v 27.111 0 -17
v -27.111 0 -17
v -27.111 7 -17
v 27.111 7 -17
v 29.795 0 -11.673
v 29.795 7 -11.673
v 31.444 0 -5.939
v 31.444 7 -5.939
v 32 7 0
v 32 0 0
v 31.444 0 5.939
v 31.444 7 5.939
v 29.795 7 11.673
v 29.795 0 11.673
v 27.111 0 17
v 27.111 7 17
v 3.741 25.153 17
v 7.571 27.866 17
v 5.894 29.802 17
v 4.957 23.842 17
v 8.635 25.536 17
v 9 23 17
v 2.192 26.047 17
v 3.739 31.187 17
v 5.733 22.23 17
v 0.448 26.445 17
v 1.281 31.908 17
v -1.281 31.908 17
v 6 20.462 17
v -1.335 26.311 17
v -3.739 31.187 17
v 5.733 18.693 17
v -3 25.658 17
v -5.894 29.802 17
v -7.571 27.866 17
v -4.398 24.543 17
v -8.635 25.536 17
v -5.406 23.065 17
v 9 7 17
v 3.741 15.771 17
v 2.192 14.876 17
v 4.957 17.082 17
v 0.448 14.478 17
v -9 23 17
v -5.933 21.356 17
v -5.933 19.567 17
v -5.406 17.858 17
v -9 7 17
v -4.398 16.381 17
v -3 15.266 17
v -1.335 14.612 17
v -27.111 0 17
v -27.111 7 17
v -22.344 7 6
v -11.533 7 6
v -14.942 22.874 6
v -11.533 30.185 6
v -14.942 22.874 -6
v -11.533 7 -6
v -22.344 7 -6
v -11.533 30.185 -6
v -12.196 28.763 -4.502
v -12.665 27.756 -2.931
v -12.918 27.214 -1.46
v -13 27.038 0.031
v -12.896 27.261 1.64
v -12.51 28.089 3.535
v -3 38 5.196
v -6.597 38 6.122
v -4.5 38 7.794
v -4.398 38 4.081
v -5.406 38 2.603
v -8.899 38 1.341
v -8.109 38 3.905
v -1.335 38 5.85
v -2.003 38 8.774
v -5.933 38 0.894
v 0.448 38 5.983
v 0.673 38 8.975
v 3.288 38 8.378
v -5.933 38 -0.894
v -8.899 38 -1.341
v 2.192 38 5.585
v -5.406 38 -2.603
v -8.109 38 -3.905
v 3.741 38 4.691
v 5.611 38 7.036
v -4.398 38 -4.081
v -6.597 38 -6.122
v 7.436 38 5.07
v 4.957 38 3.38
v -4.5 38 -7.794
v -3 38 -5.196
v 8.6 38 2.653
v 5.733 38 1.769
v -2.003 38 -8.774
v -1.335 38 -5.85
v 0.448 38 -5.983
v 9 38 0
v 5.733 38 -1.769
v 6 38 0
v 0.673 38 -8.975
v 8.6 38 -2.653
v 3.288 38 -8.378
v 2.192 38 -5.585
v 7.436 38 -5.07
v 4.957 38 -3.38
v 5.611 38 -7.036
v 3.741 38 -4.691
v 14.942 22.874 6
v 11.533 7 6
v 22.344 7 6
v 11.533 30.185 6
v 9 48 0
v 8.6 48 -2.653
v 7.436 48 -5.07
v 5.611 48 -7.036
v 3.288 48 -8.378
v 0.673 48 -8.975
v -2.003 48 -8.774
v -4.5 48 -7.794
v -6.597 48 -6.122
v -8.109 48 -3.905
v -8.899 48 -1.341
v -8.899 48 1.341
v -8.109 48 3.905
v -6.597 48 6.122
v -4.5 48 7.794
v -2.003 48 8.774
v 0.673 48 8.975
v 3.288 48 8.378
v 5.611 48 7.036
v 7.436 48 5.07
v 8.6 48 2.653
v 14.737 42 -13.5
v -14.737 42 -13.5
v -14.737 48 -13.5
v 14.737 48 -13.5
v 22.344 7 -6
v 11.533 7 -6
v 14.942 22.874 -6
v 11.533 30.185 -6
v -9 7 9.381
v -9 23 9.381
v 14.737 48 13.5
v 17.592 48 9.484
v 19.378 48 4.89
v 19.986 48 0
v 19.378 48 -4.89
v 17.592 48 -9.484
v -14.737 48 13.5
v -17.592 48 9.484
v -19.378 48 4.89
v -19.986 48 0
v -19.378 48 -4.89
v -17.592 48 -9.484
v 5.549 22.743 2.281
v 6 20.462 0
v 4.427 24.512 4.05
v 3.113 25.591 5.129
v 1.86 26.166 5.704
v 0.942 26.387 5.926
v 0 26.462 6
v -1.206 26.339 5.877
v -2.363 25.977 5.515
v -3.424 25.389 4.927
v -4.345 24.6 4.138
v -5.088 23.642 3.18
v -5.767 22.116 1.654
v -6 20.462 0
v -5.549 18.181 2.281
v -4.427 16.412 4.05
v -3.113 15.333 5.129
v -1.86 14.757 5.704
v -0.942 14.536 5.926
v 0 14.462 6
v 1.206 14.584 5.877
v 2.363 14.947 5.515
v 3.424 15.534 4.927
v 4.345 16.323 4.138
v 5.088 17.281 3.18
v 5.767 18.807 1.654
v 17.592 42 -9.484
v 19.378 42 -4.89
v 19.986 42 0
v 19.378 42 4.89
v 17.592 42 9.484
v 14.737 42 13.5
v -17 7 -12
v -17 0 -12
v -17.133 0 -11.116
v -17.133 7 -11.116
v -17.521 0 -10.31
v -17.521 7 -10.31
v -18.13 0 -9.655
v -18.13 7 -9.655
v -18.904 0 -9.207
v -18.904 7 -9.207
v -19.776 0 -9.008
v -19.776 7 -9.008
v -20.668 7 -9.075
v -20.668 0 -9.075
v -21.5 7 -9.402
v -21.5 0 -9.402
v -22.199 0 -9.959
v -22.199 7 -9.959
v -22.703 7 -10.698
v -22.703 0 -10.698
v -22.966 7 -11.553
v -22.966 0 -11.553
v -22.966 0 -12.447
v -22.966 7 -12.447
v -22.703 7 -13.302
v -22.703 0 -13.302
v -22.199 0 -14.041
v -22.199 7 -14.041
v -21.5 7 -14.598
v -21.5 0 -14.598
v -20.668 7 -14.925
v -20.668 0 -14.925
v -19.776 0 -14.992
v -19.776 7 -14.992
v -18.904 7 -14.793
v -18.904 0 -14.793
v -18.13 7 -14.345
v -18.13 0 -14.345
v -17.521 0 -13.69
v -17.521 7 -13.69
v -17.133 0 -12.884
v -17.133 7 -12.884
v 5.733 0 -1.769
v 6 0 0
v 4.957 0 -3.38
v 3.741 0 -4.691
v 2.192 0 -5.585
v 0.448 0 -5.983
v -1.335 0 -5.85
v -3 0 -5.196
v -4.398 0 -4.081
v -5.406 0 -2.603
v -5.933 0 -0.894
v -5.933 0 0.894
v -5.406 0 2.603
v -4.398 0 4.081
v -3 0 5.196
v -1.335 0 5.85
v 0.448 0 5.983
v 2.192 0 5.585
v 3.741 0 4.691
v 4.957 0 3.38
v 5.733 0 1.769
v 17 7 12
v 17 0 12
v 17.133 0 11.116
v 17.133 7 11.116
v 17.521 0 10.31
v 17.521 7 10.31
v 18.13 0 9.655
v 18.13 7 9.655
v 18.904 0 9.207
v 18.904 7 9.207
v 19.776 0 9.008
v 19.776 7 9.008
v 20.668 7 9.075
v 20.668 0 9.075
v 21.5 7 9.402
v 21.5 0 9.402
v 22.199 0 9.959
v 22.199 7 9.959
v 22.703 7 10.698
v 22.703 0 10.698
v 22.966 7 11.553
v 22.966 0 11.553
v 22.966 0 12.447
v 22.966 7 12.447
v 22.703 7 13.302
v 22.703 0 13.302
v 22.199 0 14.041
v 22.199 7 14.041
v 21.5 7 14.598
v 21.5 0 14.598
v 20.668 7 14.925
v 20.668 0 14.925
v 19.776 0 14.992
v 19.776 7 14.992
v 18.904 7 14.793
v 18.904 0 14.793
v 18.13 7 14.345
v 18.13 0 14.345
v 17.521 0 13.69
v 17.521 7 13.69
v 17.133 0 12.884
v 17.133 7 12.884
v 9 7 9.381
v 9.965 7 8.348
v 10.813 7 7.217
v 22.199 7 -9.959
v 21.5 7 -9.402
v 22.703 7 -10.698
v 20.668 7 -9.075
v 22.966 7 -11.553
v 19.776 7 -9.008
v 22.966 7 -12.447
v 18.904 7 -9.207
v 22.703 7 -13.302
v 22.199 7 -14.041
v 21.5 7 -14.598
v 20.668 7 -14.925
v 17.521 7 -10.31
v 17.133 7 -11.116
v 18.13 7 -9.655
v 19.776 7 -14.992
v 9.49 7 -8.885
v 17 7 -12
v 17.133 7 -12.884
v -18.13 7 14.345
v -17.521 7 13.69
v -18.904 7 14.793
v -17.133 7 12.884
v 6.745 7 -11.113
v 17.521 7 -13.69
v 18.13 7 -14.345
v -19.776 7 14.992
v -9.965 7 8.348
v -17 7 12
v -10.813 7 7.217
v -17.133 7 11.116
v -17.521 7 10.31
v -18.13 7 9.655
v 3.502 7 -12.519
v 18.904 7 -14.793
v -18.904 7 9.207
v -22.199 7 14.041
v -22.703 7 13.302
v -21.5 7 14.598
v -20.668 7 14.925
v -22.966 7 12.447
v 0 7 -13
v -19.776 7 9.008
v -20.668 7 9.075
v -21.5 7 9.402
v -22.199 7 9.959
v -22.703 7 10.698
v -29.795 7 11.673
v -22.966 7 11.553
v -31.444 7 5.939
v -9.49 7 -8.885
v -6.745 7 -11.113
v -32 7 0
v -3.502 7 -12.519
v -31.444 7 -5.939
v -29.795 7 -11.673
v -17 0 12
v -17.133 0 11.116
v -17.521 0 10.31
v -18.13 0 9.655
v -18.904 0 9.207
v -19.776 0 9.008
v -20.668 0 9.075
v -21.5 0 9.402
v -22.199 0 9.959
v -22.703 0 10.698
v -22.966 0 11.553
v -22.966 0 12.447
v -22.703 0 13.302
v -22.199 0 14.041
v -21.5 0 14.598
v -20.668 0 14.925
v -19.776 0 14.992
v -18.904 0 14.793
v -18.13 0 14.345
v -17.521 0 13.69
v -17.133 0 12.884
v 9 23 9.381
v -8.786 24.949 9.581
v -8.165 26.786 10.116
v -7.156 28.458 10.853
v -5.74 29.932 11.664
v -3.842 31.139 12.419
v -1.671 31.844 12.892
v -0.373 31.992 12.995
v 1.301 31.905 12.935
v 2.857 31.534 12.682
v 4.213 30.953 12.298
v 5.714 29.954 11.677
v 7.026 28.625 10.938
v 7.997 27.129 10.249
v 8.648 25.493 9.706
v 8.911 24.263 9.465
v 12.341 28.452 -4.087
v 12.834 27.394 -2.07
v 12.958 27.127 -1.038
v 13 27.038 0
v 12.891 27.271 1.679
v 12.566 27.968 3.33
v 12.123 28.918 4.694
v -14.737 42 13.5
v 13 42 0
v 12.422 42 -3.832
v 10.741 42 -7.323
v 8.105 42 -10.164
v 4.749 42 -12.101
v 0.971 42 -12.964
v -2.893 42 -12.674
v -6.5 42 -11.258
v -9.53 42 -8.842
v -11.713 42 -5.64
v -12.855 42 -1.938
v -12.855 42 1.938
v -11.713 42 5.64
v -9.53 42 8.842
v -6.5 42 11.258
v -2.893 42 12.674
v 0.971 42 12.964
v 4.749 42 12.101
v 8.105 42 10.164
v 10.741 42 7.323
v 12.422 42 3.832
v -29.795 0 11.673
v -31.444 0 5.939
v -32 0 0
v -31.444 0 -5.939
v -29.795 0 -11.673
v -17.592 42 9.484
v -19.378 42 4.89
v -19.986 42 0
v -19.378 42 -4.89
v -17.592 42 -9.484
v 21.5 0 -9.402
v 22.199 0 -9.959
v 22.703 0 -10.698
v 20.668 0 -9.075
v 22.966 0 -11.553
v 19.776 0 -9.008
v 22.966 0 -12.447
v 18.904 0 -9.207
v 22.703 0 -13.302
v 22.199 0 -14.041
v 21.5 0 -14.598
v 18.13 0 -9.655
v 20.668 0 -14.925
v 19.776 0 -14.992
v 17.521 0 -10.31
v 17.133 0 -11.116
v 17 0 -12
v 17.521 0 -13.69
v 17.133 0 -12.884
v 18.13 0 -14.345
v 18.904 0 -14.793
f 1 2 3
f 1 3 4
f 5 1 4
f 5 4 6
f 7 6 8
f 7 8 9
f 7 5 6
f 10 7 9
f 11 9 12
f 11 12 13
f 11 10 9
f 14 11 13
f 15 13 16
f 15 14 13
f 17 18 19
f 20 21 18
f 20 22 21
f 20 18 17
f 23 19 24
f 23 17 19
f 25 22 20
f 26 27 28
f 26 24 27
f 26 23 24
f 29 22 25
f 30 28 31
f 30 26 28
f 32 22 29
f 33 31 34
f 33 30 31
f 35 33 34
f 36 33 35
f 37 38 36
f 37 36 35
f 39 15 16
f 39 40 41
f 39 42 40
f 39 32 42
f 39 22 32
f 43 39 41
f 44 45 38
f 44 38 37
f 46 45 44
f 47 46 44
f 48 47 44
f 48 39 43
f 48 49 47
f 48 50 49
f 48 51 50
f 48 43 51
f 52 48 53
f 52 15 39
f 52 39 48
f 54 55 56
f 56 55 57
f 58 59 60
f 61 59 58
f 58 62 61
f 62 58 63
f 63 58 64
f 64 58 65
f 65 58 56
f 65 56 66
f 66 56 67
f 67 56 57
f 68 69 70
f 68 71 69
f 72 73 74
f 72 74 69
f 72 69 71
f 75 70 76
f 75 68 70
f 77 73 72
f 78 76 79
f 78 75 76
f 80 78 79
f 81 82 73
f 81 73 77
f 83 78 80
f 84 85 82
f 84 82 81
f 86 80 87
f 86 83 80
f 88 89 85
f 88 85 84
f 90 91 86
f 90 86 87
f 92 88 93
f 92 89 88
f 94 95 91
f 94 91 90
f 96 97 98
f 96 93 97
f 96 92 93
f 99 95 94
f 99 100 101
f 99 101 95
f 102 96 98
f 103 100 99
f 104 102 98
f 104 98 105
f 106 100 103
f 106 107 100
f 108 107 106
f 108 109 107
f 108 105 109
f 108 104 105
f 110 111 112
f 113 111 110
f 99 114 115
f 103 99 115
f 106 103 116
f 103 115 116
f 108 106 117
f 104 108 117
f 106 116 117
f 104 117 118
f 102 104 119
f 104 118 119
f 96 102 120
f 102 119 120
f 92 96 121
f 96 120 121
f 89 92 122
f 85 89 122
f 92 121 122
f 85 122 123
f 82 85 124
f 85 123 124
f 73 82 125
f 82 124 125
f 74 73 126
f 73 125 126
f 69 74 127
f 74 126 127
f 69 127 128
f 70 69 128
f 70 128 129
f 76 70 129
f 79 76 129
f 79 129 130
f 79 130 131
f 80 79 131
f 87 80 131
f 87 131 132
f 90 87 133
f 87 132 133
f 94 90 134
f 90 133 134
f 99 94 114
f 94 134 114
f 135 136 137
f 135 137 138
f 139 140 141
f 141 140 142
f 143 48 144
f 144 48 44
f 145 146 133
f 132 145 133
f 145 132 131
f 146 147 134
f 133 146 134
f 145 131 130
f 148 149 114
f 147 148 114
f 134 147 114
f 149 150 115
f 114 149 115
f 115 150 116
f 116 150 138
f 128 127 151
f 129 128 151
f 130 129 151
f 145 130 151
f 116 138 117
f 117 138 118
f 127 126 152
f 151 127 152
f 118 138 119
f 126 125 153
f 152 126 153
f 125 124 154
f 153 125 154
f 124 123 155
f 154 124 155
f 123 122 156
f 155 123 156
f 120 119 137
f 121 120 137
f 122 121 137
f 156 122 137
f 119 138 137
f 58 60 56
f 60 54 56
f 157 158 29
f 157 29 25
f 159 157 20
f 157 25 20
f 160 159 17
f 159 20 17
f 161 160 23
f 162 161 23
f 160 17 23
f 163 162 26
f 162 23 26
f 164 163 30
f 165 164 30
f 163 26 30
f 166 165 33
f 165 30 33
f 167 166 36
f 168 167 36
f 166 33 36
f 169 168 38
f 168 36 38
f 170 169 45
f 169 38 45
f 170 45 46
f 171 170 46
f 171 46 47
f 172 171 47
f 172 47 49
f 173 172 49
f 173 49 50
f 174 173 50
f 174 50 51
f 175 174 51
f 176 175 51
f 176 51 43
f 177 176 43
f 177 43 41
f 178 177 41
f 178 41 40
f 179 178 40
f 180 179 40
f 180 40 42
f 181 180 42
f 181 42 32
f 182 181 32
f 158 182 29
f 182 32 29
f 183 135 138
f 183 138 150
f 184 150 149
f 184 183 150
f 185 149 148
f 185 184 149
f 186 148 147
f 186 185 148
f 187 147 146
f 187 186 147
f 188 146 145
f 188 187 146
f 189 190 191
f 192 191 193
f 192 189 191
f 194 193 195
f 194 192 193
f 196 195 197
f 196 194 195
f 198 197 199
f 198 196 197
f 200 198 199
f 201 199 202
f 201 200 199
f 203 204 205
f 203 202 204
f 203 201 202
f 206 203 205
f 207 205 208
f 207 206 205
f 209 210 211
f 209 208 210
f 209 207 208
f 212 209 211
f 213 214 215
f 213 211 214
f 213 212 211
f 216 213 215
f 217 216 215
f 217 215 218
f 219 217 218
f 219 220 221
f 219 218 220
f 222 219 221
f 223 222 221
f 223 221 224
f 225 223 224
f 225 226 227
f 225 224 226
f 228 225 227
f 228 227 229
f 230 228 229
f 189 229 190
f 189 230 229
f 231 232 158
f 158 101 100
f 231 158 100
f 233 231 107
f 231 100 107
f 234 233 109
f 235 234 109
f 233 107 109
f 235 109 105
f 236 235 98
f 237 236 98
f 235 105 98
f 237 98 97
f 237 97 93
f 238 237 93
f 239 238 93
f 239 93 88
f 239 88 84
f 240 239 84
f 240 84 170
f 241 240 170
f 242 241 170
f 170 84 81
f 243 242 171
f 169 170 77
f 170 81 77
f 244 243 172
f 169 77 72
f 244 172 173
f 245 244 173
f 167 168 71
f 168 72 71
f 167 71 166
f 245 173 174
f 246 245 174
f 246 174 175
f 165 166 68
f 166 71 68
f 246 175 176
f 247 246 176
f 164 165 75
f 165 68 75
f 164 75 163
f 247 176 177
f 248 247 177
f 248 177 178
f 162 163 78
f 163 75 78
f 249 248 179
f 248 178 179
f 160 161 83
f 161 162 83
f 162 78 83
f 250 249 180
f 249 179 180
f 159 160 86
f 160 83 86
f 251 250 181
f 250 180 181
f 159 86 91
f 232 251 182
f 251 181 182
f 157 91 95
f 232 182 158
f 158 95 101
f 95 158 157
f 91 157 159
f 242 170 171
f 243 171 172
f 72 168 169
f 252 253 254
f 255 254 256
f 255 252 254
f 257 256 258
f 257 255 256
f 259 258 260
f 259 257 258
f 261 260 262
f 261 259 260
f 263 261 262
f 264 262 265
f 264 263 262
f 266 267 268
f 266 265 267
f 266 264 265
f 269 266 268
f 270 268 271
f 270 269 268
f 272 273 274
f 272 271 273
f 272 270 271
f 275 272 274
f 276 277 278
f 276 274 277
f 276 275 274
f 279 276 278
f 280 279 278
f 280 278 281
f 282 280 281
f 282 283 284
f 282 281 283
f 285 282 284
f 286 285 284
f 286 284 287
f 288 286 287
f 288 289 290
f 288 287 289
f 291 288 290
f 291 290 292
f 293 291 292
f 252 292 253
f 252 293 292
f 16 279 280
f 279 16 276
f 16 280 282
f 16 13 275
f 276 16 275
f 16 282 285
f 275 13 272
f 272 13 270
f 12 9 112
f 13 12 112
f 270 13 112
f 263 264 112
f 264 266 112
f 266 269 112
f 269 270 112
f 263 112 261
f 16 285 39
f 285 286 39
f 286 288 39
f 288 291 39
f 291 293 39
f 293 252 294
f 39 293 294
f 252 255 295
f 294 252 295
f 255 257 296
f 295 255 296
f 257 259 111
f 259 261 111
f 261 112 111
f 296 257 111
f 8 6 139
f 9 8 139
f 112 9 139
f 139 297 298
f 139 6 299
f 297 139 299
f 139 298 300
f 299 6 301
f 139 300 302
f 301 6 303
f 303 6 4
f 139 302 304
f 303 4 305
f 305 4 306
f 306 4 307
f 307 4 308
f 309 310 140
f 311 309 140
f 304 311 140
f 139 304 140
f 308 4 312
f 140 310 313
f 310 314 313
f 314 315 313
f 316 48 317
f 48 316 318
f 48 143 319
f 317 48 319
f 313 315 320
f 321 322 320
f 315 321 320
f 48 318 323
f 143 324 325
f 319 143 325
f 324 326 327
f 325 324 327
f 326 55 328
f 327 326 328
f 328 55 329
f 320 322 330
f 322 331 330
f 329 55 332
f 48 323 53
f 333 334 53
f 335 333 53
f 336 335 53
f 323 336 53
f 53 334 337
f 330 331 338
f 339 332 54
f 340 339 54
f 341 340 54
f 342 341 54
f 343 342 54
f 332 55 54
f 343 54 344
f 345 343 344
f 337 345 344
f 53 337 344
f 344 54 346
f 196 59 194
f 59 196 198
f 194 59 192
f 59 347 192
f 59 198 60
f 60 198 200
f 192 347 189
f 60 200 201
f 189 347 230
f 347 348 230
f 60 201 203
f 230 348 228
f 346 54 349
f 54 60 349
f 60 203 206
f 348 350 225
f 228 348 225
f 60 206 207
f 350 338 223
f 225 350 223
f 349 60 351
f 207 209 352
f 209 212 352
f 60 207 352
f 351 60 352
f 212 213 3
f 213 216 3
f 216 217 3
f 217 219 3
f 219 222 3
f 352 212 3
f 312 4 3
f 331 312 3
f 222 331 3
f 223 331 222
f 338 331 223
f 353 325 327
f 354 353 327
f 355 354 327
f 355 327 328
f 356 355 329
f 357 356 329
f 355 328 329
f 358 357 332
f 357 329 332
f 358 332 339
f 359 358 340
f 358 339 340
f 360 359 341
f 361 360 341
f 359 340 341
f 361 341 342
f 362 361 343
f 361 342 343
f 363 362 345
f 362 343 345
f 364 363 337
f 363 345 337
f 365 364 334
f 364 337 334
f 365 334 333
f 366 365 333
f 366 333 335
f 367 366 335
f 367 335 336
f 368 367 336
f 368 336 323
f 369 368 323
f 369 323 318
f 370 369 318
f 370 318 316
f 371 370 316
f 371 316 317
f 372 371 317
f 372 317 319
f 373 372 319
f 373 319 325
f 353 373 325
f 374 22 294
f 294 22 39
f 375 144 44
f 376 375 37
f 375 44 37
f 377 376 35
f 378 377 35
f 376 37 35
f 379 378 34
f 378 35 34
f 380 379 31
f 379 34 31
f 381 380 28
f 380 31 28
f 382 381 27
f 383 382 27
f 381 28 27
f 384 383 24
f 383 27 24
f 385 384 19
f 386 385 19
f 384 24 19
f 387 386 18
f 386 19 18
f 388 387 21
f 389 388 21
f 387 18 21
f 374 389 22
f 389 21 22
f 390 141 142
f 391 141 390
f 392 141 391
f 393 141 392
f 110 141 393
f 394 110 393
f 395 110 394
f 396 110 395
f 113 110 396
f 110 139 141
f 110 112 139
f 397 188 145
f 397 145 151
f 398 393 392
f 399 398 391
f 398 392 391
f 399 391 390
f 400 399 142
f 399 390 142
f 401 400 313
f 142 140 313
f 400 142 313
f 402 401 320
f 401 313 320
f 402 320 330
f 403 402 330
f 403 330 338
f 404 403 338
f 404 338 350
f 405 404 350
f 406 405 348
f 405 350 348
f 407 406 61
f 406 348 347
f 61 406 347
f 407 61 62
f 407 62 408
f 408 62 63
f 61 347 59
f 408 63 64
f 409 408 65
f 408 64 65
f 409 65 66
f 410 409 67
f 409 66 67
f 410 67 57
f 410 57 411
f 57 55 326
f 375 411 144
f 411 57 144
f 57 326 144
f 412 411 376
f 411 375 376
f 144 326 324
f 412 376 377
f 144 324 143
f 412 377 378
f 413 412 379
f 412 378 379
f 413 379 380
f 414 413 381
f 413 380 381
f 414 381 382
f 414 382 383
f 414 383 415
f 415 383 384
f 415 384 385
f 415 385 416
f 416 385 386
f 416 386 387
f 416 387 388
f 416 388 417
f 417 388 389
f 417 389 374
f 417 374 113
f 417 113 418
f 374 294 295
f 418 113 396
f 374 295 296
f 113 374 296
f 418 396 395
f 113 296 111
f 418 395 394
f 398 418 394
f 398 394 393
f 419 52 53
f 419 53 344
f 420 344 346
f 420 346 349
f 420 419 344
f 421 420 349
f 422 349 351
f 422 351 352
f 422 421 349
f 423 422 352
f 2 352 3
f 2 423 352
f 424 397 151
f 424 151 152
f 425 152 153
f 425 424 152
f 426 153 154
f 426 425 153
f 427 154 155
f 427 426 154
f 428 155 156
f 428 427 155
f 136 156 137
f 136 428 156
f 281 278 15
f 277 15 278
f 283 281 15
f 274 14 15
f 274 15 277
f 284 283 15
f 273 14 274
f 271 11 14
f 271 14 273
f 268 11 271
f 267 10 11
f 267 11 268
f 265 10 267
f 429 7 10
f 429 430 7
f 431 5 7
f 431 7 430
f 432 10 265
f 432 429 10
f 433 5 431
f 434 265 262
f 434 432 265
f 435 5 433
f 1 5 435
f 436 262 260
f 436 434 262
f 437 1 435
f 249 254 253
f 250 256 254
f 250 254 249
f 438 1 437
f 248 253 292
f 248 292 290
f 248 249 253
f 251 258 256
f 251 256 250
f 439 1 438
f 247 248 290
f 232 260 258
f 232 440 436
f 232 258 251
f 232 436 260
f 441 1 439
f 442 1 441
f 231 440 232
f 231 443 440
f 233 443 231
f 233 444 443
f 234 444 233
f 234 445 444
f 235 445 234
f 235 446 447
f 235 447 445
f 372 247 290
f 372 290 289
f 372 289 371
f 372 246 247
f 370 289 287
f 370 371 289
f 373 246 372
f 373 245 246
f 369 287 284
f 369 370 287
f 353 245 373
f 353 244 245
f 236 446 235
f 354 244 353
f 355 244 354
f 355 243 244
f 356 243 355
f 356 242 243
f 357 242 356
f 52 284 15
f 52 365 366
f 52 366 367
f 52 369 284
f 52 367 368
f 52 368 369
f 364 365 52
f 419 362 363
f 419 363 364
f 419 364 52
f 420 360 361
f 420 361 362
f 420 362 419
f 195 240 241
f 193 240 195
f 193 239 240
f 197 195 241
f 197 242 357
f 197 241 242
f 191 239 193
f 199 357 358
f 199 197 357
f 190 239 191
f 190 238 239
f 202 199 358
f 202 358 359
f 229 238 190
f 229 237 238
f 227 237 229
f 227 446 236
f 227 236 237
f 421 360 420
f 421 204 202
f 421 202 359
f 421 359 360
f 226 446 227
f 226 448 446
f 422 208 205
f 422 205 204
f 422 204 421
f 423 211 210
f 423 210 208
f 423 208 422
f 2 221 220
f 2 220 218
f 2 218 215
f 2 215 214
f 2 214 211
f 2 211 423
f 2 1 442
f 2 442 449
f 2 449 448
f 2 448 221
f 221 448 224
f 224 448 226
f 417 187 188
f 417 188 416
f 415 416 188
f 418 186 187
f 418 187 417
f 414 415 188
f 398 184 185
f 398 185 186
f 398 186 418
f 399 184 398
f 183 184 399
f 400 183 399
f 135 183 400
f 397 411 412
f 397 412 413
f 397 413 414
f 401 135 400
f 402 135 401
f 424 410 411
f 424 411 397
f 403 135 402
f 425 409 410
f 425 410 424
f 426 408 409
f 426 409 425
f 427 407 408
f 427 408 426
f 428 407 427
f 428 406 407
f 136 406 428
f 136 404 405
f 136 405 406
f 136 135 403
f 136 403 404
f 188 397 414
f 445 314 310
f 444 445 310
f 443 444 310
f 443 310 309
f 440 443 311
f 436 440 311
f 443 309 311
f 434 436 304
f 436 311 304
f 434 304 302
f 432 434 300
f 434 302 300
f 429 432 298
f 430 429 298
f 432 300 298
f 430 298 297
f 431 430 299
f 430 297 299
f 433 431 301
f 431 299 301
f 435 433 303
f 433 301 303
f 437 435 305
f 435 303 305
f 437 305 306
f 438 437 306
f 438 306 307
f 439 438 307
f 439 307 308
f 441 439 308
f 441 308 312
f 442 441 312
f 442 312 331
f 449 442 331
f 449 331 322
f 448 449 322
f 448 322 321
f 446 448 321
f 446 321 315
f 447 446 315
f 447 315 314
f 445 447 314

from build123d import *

# Parameters (mm, degrees)
EXTRUDE_1_DEPTH          = 7
SKETCH_2_R               = 3
CUT_EXTRUDE_1_DEPTH      = 8
MIRROR_2_COPY_1_SKETCH_R = 3
MIRROR_2_COPY_1_DEPTH    = 8
SKETCH_3_R               = 13
EXTRUDE_2_DEPTH          = 35
EXTRUDE_3_DEPTH          = 6
SKETCH_5_R               = 9
CUT_EXTRUDE_2_DEPTH      = 10
SKETCH_6_R               = 6
CUT_EXTRUDE_3_DEPTH      = 39
EXTRUDE_4_REACH          = 36
CUT_EXTRUDE_4_REACH      = 36
SKETCH_8_R               = 6
EXTRUDE_6_DEPTH          = 6


with BuildPart() as part:
    # 草图1 → 凸台-拉伸1 (new body)
    with BuildSketch(Plane(origin=(0, 0, 0), x_dir=(1, 0, 0), z_dir=(0, 1, 0))):
        with BuildLine():
            Line((-27.110883423, 17), (27.110883423, 17))
            ThreePointArc((27.110883423, 17), (32, 0), (27.110883423, -17))
            Line((27.110883423, -17), (-27.110883423, -17))
            ThreePointArc((-27.110883423, -17), (-32, 0), (-27.110883423, 17))
        make_face()
    extrude(amount=EXTRUDE_1_DEPTH)

    # 草图2 → 切除-拉伸1 (cut, through all)
    with BuildSketch(Plane(origin=(0, 7, 0), x_dir=(1, 0, 0), z_dir=(0, 1, 0))):
        with Locations((-20, -12)):
            Circle(SKETCH_2_R)
    cut_extrude_1 = extrude(amount=-CUT_EXTRUDE_1_DEPTH, mode=Mode.SUBTRACT)

    # 镜向1: 切除-拉伸1 across plane
    add(cut_extrude_1.mirror(Plane(origin=(0, 0, 0), x_dir=(0, 0, 1), z_dir=(1, 0, 0))), mode=Mode.SUBTRACT)

    # 镜向2: 切除-拉伸1 across plane
    add(cut_extrude_1.mirror(Plane.XY), mode=Mode.SUBTRACT)

    # 镜向2 copy 1 sketch → 镜向2 copy 1 (cut, through all)
    with BuildSketch(Plane(origin=(0, 7, 0), x_dir=(-1, 0, 0), z_dir=(0, 1, 0))):
        with Locations((-20, -12)):
            Circle(MIRROR_2_COPY_1_SKETCH_R)
    extrude(amount=-MIRROR_2_COPY_1_DEPTH, mode=Mode.SUBTRACT)

    # 草图3 → 凸台-拉伸2 (add)
    with BuildSketch(Plane(origin=(0, 7, 0), x_dir=(1, 0, 0), z_dir=(0, 1, 0))):
        Circle(SKETCH_3_R)
    extrude(amount=EXTRUDE_2_DEPTH)

    # 草图4 → 凸台-拉伸3 (add)
    with BuildSketch(Plane(origin=(0, 42, 0), x_dir=(1, 0, 0), z_dir=(0, 1, 0))):
        with BuildLine():
            Line((-14.736938996, 13.5), (14.736938996, 13.5))
            ThreePointArc((14.736938996, 13.5), (19.985679147, 0), (14.736938996, -13.5))
            Line((14.736938996, -13.5), (-14.736938996, -13.5))
            ThreePointArc((-14.736938996, -13.5), (-19.985679147, 0), (-14.736938996, 13.5))
        make_face()
    extrude(amount=EXTRUDE_3_DEPTH)

    # 草图5 → 切除-拉伸2 (cut)
    with BuildSketch(Plane(origin=(0, 48, 0), x_dir=(1, 0, 0), z_dir=(0, 1, 0))):
        Circle(SKETCH_5_R)
    extrude(amount=-CUT_EXTRUDE_2_DEPTH, mode=Mode.SUBTRACT)

    # 草图6 → 切除-拉伸3 (cut, through all)
    with BuildSketch(Plane(origin=(0, 38, 0), x_dir=(1, 0, 0), z_dir=(0, 1, 0))):
        Circle(SKETCH_6_R)
    extrude(amount=-CUT_EXTRUDE_3_DEPTH, mode=Mode.SUBTRACT)

    # 草图7 → 凸台-拉伸4 (add, up to next)
    with BuildSketch(Plane.XY.offset(17), mode=Mode.PRIVATE) as extrude_4_sk1:
        with BuildLine():
            Line((-9, 7), (-9, 23))
            ThreePointArc((-9, 23), (0, 32), (9, 23))
            Line((9, 23), (9, 7))
            Line((9, 7), (-9, 7))
        make_face()
    extrude_4_tool1 = extrude(extrude_4_sk1.sketch, amount=-EXTRUDE_4_REACH, mode=Mode.PRIVATE) - part.part
    add(extrude_4_tool1.solids().sort_by_distance((0, 18.621751, 17))[0])

    # 草图8 → 切除-拉伸4 (cut, up to next)
    with BuildSketch(Plane.XY.offset(17), mode=Mode.PRIVATE) as cut_extrude_4_sk1:
        with Locations((0, 20.461682424)):
            Circle(SKETCH_8_R)
    cut_extrude_4_tool1 = extrude(cut_extrude_4_sk1.sketch, amount=-CUT_EXTRUDE_4_REACH, mode=Mode.PRIVATE) & part.part
    add(cut_extrude_4_tool1.solids().sort_by_distance((0, 20.461682, 17))[0], mode=Mode.SUBTRACT)

    # 草图10 → 凸台-拉伸6 (add, symmetric)
    with BuildSketch(Plane.XY):
        Polygon((-10.493273041, 6.945714178), (-22.343826616, 7), (-14.941545846, 22.874242338), (-10.666084354, 32.042999097), align=None)
    extrude_6 = extrude(amount=EXTRUDE_6_DEPTH, both=True)

    # 镜向4: 凸台-拉伸6 across plane
    add(extrude_6.mirror(Plane(origin=(0, 0, 0), x_dir=(0, 0, 1), z_dir=(1, 0, 0))))


solid = part.part
